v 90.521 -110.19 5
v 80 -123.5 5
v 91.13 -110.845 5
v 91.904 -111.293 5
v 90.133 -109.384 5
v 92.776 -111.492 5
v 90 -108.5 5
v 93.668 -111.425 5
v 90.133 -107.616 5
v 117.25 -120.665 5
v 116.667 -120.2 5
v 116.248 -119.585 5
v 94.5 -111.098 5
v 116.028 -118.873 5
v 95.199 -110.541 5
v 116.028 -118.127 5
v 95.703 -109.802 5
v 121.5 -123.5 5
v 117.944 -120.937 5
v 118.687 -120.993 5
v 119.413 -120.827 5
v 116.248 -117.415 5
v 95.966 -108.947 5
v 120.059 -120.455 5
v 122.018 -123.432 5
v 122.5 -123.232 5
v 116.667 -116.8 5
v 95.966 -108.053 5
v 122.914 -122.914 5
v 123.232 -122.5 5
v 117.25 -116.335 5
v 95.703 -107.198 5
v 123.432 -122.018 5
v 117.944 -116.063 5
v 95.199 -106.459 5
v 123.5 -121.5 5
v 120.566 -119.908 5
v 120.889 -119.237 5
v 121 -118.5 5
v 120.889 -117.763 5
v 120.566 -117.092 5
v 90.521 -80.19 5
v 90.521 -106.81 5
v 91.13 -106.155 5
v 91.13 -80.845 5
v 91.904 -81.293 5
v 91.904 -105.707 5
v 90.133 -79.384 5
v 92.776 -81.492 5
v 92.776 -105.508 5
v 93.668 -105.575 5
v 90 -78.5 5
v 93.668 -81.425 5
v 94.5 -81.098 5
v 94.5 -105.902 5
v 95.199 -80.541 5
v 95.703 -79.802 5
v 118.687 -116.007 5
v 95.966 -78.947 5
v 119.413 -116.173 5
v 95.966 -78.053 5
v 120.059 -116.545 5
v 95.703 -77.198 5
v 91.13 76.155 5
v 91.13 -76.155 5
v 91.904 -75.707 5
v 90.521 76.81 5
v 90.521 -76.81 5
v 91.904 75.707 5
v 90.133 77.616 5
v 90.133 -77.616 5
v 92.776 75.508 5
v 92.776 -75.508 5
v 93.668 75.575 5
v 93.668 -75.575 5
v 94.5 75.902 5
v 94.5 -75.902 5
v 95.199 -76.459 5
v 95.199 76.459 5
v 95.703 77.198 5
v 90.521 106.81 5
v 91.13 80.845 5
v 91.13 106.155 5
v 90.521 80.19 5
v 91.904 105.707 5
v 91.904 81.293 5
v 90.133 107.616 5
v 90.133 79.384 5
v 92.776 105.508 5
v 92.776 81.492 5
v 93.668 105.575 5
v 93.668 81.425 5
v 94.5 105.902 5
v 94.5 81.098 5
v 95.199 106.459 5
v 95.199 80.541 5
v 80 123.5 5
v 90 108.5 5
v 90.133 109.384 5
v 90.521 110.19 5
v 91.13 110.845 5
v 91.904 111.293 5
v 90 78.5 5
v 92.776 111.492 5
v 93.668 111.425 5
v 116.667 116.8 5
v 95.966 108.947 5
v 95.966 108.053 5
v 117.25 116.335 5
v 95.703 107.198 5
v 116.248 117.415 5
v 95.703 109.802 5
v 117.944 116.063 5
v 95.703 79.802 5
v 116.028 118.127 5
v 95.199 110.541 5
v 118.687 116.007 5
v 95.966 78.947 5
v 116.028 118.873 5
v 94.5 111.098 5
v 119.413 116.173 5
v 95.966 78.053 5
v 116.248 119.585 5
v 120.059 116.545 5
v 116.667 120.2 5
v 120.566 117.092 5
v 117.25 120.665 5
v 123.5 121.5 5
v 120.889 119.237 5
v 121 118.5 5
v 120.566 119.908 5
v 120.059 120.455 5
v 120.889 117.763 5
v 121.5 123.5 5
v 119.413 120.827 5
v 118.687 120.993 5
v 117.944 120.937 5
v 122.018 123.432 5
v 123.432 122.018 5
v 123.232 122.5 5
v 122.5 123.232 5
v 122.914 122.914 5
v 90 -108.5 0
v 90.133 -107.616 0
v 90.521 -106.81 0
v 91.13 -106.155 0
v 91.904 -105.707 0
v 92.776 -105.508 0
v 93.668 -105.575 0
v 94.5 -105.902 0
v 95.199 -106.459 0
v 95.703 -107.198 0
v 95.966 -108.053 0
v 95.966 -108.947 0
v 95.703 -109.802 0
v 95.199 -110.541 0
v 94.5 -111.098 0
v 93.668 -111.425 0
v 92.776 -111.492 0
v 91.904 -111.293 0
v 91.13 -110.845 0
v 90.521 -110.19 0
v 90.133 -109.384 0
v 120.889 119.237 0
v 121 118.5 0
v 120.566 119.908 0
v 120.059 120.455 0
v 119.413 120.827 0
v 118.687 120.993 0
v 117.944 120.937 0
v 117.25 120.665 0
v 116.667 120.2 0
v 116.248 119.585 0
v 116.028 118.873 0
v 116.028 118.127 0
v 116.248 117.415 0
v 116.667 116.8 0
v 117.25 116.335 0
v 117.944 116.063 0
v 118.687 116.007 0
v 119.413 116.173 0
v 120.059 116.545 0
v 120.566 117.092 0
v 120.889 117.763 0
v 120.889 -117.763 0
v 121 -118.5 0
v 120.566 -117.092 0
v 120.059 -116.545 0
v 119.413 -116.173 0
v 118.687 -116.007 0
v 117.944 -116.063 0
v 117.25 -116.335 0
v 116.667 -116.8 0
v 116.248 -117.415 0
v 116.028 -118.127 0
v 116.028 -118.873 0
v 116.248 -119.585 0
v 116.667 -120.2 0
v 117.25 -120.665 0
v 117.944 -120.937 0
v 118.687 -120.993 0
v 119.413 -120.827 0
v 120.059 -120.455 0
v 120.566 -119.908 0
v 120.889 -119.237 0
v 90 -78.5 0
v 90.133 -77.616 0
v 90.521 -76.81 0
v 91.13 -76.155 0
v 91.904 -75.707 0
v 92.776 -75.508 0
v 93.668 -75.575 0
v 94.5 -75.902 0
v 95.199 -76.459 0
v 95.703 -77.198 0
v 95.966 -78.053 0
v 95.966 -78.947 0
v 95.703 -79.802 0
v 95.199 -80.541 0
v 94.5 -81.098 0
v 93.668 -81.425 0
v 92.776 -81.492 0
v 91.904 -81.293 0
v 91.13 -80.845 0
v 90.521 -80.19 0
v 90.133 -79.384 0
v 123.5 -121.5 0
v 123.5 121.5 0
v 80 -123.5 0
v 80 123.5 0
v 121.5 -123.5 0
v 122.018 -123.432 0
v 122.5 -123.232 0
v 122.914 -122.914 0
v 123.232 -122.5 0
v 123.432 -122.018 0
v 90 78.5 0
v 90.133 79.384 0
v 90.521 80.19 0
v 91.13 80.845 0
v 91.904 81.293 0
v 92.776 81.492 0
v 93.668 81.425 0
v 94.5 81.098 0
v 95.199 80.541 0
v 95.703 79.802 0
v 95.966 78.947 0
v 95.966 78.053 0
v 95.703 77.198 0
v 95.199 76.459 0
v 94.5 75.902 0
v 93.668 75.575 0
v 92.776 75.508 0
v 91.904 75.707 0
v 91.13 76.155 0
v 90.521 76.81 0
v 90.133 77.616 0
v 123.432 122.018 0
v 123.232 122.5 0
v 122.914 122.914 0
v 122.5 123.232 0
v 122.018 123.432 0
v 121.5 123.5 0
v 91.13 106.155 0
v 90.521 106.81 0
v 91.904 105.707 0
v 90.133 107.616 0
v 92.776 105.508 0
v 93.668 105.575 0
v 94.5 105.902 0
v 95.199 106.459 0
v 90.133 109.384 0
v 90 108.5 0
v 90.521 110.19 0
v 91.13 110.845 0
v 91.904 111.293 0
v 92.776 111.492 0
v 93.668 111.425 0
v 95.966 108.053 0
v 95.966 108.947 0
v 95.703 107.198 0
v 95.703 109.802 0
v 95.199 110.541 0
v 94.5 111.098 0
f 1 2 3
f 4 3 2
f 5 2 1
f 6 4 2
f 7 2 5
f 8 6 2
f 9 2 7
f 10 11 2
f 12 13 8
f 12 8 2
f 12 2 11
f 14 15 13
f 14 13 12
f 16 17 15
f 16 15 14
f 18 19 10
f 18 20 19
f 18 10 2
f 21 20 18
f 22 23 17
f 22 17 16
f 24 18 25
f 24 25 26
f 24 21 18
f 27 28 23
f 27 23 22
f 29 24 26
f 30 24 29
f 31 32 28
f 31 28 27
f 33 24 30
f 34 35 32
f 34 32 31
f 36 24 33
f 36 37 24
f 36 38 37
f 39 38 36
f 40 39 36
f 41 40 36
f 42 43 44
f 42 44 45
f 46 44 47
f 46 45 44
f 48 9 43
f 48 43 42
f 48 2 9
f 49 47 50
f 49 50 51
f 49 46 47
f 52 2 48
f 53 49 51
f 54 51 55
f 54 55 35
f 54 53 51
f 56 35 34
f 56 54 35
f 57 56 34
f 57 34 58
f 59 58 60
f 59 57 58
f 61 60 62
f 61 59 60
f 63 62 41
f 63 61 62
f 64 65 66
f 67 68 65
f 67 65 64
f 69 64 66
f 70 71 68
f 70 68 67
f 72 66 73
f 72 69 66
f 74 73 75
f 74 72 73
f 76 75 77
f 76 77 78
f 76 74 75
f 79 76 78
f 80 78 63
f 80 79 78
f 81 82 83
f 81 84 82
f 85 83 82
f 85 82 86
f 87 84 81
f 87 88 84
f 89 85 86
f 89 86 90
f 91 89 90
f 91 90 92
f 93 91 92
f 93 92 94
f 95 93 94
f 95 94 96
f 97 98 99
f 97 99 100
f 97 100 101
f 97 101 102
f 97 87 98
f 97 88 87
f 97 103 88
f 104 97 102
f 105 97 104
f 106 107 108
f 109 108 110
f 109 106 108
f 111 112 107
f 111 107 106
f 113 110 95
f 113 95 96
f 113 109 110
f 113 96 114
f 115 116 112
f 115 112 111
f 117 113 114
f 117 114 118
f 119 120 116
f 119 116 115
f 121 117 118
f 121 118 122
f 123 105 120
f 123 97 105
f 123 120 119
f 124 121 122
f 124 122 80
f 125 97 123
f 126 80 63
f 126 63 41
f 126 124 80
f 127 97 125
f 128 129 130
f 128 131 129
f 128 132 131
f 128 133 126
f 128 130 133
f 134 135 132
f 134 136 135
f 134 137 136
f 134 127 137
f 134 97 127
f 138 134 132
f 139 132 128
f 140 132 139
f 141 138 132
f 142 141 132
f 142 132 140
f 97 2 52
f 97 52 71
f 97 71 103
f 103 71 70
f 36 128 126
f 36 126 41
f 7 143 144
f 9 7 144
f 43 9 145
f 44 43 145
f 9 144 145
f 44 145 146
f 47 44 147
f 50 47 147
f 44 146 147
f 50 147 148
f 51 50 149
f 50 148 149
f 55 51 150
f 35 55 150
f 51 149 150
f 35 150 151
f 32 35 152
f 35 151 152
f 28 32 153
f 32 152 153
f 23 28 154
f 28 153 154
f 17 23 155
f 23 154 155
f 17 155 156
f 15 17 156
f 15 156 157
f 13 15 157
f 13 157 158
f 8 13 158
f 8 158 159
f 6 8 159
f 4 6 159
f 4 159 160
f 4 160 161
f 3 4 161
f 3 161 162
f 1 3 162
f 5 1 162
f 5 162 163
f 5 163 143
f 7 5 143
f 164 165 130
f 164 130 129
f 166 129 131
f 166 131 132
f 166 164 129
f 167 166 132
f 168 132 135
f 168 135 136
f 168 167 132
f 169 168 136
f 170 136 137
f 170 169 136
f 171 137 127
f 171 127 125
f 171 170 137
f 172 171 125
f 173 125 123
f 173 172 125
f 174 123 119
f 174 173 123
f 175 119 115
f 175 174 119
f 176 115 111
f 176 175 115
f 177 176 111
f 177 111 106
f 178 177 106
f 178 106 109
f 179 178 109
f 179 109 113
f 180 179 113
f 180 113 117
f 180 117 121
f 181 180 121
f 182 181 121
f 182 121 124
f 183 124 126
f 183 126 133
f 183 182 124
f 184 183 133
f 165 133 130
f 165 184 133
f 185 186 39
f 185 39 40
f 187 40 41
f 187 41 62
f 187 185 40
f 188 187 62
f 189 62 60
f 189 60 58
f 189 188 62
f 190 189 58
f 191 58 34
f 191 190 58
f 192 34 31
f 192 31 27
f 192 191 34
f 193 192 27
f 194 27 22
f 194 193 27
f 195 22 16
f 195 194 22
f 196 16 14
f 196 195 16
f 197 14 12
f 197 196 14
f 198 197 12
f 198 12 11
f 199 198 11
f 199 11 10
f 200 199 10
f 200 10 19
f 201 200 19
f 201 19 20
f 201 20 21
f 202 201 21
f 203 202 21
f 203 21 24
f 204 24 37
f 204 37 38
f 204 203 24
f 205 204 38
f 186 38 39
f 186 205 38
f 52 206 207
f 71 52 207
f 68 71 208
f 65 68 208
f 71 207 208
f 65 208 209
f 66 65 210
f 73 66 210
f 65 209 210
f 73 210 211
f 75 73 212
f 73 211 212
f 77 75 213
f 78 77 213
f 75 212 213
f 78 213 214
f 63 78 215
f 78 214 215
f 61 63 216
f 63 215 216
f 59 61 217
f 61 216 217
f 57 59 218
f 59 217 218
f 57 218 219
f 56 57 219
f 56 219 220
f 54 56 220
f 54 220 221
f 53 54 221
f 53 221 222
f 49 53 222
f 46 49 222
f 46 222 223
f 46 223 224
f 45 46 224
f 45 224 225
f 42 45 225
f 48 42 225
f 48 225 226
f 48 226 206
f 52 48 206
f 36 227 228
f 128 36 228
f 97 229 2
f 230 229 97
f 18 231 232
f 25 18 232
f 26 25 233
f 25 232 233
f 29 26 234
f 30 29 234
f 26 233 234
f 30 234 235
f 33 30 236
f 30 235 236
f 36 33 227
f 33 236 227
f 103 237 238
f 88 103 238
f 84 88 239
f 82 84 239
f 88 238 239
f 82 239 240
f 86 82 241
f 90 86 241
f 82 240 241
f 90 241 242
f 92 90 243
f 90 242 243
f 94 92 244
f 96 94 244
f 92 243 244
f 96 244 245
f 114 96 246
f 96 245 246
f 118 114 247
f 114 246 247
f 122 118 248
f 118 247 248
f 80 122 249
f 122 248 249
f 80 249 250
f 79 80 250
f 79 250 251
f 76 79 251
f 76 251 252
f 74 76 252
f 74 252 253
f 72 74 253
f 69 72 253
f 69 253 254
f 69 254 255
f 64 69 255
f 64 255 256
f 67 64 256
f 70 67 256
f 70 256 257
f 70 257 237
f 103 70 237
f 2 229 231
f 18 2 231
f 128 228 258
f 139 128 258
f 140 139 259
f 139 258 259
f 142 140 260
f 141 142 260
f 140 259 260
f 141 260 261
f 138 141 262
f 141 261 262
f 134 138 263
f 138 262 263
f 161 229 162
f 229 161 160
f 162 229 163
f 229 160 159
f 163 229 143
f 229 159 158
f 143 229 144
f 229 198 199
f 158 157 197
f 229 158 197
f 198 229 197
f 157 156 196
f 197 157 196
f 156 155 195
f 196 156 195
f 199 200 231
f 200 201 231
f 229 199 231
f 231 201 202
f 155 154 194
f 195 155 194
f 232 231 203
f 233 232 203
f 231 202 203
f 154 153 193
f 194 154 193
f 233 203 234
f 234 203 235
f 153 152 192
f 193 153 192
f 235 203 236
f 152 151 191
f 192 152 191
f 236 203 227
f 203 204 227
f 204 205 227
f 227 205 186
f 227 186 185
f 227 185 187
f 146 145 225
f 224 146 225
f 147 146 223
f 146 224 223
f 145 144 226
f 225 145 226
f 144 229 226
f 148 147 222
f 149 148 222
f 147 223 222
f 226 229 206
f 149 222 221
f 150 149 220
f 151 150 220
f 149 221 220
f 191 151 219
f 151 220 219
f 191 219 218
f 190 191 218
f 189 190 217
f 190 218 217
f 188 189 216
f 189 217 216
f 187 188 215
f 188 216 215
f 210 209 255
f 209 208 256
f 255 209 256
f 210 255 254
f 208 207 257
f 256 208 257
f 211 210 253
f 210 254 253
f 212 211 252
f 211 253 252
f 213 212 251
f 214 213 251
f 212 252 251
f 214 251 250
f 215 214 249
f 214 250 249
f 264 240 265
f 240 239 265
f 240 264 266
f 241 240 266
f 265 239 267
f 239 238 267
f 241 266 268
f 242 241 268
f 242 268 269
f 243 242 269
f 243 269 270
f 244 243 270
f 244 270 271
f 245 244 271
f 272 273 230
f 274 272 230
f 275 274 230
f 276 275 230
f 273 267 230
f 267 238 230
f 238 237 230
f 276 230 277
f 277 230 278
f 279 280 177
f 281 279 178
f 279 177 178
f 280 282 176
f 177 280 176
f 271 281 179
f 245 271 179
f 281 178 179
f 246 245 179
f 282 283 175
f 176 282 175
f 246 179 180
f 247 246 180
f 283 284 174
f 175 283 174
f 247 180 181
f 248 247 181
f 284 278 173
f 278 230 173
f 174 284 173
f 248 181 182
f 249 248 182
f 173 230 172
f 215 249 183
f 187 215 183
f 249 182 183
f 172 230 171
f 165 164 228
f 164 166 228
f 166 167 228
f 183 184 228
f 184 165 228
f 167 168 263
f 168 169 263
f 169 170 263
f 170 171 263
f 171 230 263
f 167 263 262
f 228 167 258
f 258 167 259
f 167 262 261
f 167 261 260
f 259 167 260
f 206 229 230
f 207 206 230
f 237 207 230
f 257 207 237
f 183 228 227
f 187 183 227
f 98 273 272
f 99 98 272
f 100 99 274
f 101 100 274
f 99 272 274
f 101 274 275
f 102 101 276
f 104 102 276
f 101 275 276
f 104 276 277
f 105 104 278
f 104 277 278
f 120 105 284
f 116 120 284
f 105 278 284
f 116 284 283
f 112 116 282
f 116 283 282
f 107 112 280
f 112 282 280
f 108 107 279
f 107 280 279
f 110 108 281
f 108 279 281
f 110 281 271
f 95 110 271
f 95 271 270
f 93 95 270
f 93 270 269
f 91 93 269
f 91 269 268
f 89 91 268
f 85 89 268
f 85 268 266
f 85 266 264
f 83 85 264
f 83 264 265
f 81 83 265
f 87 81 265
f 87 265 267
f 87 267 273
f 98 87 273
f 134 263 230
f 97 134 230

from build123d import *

# Parameters (mm, degrees)
SKETCH1_R           = 2.5
BOSS_EXTRUDE1_DEPTH = 5
SKETCH2_R           = 1.5
SKETCH2_W           = 50
SKETCH2_H           = 50
CUT_EXTRUDE1_DEPTH  = 5
SKETCH3_W           = 250
SKETCH3_H           = 300
CUT_EXTRUDE2_DEPTH  = 10
SKETCH4_R           = 3
CUT_EXTRUDE3_DEPTH  = 10


with BuildPart() as part:
    # Sketch1 → Boss-Extrude1 (new body)
    with BuildSketch(Plane.XY):
        with BuildLine():
            Line((-123.5, 121.5), (-123.5, -121.5))
            ThreePointArc((-123.5, -121.5), (-122.914213562, -122.914213562), (-121.5, -123.5))
            Line((-121.5, -123.5), (121.5, -123.5))
            ThreePointArc((121.5, -123.5), (122.914213562, -122.914213562), (123.5, -121.5))
            Line((123.5, -121.5), (123.5, 121.5))
            ThreePointArc((123.5, 121.5), (122.914213562, 122.914213562), (121.5, 123.5))
            Line((121.5, 123.5), (-121.5, 123.5))
            ThreePointArc((-121.5, 123.5), (-122.914213562, 122.914213562), (-123.5, 121.5))
        make_face()
        with Locations((-118.5, 118.5)):
            Circle(SKETCH1_R, mode=Mode.SUBTRACT)
        with Locations((118.5, 118.5)):
            Circle(SKETCH1_R, mode=Mode.SUBTRACT)
        with Locations((118.5, -118.5)):
            Circle(SKETCH1_R, mode=Mode.SUBTRACT)
        with Locations((-118.5, -118.5)):
            Circle(SKETCH1_R, mode=Mode.SUBTRACT)
    extrude(amount=BOSS_EXTRUDE1_DEPTH)

    # Sketch2 → Cut-Extrude1 (cut)
    with BuildSketch(Plane(origin=(0, 0, 0), x_dir=(-1, 0, 0), z_dir=(0, 0, -1))):
        with Locations((28.284271247, 28.284271247)):
            Circle(SKETCH2_R)
        with Locations((28.284271247, -28.284271247)):
            Circle(SKETCH2_R)
        with Locations((-28.284271247, -28.284271247)):
            Circle(SKETCH2_R)
        with Locations((-28.284271247, 28.284271247)):
            Circle(SKETCH2_R)
        Rectangle(SKETCH2_W, SKETCH2_H)
    extrude(amount=-CUT_EXTRUDE1_DEPTH, mode=Mode.SUBTRACT)

    # Sketch3 → Cut-Extrude2 (cut)
    with BuildSketch(Plane(origin=(0, 0, 0), x_dir=(-1, 0, 0), z_dir=(0, 0, -1))):
        with Locations((45, 0)):
            Rectangle(SKETCH3_W, SKETCH3_H)
    extrude(amount=-CUT_EXTRUDE2_DEPTH, mode=Mode.SUBTRACT)

    # Sketch4 → Cut-Extrude3 (cut)
    with BuildSketch(Plane(origin=(0, 0, 0), x_dir=(-1, 0, 0), z_dir=(0, 0, -1))):
        with Locations((-93, 78.5)):
            Circle(SKETCH4_R)
        with Locations((-93, 108.5)):
            Circle(SKETCH4_R)
        with Locations((-93, -78.5)):
            Circle(SKETCH4_R)
        with Locations((-93, -108.5)):
            Circle(SKETCH4_R)
    extrude(amount=-CUT_EXTRUDE3_DEPTH, mode=Mode.SUBTRACT)


solid = part.part
